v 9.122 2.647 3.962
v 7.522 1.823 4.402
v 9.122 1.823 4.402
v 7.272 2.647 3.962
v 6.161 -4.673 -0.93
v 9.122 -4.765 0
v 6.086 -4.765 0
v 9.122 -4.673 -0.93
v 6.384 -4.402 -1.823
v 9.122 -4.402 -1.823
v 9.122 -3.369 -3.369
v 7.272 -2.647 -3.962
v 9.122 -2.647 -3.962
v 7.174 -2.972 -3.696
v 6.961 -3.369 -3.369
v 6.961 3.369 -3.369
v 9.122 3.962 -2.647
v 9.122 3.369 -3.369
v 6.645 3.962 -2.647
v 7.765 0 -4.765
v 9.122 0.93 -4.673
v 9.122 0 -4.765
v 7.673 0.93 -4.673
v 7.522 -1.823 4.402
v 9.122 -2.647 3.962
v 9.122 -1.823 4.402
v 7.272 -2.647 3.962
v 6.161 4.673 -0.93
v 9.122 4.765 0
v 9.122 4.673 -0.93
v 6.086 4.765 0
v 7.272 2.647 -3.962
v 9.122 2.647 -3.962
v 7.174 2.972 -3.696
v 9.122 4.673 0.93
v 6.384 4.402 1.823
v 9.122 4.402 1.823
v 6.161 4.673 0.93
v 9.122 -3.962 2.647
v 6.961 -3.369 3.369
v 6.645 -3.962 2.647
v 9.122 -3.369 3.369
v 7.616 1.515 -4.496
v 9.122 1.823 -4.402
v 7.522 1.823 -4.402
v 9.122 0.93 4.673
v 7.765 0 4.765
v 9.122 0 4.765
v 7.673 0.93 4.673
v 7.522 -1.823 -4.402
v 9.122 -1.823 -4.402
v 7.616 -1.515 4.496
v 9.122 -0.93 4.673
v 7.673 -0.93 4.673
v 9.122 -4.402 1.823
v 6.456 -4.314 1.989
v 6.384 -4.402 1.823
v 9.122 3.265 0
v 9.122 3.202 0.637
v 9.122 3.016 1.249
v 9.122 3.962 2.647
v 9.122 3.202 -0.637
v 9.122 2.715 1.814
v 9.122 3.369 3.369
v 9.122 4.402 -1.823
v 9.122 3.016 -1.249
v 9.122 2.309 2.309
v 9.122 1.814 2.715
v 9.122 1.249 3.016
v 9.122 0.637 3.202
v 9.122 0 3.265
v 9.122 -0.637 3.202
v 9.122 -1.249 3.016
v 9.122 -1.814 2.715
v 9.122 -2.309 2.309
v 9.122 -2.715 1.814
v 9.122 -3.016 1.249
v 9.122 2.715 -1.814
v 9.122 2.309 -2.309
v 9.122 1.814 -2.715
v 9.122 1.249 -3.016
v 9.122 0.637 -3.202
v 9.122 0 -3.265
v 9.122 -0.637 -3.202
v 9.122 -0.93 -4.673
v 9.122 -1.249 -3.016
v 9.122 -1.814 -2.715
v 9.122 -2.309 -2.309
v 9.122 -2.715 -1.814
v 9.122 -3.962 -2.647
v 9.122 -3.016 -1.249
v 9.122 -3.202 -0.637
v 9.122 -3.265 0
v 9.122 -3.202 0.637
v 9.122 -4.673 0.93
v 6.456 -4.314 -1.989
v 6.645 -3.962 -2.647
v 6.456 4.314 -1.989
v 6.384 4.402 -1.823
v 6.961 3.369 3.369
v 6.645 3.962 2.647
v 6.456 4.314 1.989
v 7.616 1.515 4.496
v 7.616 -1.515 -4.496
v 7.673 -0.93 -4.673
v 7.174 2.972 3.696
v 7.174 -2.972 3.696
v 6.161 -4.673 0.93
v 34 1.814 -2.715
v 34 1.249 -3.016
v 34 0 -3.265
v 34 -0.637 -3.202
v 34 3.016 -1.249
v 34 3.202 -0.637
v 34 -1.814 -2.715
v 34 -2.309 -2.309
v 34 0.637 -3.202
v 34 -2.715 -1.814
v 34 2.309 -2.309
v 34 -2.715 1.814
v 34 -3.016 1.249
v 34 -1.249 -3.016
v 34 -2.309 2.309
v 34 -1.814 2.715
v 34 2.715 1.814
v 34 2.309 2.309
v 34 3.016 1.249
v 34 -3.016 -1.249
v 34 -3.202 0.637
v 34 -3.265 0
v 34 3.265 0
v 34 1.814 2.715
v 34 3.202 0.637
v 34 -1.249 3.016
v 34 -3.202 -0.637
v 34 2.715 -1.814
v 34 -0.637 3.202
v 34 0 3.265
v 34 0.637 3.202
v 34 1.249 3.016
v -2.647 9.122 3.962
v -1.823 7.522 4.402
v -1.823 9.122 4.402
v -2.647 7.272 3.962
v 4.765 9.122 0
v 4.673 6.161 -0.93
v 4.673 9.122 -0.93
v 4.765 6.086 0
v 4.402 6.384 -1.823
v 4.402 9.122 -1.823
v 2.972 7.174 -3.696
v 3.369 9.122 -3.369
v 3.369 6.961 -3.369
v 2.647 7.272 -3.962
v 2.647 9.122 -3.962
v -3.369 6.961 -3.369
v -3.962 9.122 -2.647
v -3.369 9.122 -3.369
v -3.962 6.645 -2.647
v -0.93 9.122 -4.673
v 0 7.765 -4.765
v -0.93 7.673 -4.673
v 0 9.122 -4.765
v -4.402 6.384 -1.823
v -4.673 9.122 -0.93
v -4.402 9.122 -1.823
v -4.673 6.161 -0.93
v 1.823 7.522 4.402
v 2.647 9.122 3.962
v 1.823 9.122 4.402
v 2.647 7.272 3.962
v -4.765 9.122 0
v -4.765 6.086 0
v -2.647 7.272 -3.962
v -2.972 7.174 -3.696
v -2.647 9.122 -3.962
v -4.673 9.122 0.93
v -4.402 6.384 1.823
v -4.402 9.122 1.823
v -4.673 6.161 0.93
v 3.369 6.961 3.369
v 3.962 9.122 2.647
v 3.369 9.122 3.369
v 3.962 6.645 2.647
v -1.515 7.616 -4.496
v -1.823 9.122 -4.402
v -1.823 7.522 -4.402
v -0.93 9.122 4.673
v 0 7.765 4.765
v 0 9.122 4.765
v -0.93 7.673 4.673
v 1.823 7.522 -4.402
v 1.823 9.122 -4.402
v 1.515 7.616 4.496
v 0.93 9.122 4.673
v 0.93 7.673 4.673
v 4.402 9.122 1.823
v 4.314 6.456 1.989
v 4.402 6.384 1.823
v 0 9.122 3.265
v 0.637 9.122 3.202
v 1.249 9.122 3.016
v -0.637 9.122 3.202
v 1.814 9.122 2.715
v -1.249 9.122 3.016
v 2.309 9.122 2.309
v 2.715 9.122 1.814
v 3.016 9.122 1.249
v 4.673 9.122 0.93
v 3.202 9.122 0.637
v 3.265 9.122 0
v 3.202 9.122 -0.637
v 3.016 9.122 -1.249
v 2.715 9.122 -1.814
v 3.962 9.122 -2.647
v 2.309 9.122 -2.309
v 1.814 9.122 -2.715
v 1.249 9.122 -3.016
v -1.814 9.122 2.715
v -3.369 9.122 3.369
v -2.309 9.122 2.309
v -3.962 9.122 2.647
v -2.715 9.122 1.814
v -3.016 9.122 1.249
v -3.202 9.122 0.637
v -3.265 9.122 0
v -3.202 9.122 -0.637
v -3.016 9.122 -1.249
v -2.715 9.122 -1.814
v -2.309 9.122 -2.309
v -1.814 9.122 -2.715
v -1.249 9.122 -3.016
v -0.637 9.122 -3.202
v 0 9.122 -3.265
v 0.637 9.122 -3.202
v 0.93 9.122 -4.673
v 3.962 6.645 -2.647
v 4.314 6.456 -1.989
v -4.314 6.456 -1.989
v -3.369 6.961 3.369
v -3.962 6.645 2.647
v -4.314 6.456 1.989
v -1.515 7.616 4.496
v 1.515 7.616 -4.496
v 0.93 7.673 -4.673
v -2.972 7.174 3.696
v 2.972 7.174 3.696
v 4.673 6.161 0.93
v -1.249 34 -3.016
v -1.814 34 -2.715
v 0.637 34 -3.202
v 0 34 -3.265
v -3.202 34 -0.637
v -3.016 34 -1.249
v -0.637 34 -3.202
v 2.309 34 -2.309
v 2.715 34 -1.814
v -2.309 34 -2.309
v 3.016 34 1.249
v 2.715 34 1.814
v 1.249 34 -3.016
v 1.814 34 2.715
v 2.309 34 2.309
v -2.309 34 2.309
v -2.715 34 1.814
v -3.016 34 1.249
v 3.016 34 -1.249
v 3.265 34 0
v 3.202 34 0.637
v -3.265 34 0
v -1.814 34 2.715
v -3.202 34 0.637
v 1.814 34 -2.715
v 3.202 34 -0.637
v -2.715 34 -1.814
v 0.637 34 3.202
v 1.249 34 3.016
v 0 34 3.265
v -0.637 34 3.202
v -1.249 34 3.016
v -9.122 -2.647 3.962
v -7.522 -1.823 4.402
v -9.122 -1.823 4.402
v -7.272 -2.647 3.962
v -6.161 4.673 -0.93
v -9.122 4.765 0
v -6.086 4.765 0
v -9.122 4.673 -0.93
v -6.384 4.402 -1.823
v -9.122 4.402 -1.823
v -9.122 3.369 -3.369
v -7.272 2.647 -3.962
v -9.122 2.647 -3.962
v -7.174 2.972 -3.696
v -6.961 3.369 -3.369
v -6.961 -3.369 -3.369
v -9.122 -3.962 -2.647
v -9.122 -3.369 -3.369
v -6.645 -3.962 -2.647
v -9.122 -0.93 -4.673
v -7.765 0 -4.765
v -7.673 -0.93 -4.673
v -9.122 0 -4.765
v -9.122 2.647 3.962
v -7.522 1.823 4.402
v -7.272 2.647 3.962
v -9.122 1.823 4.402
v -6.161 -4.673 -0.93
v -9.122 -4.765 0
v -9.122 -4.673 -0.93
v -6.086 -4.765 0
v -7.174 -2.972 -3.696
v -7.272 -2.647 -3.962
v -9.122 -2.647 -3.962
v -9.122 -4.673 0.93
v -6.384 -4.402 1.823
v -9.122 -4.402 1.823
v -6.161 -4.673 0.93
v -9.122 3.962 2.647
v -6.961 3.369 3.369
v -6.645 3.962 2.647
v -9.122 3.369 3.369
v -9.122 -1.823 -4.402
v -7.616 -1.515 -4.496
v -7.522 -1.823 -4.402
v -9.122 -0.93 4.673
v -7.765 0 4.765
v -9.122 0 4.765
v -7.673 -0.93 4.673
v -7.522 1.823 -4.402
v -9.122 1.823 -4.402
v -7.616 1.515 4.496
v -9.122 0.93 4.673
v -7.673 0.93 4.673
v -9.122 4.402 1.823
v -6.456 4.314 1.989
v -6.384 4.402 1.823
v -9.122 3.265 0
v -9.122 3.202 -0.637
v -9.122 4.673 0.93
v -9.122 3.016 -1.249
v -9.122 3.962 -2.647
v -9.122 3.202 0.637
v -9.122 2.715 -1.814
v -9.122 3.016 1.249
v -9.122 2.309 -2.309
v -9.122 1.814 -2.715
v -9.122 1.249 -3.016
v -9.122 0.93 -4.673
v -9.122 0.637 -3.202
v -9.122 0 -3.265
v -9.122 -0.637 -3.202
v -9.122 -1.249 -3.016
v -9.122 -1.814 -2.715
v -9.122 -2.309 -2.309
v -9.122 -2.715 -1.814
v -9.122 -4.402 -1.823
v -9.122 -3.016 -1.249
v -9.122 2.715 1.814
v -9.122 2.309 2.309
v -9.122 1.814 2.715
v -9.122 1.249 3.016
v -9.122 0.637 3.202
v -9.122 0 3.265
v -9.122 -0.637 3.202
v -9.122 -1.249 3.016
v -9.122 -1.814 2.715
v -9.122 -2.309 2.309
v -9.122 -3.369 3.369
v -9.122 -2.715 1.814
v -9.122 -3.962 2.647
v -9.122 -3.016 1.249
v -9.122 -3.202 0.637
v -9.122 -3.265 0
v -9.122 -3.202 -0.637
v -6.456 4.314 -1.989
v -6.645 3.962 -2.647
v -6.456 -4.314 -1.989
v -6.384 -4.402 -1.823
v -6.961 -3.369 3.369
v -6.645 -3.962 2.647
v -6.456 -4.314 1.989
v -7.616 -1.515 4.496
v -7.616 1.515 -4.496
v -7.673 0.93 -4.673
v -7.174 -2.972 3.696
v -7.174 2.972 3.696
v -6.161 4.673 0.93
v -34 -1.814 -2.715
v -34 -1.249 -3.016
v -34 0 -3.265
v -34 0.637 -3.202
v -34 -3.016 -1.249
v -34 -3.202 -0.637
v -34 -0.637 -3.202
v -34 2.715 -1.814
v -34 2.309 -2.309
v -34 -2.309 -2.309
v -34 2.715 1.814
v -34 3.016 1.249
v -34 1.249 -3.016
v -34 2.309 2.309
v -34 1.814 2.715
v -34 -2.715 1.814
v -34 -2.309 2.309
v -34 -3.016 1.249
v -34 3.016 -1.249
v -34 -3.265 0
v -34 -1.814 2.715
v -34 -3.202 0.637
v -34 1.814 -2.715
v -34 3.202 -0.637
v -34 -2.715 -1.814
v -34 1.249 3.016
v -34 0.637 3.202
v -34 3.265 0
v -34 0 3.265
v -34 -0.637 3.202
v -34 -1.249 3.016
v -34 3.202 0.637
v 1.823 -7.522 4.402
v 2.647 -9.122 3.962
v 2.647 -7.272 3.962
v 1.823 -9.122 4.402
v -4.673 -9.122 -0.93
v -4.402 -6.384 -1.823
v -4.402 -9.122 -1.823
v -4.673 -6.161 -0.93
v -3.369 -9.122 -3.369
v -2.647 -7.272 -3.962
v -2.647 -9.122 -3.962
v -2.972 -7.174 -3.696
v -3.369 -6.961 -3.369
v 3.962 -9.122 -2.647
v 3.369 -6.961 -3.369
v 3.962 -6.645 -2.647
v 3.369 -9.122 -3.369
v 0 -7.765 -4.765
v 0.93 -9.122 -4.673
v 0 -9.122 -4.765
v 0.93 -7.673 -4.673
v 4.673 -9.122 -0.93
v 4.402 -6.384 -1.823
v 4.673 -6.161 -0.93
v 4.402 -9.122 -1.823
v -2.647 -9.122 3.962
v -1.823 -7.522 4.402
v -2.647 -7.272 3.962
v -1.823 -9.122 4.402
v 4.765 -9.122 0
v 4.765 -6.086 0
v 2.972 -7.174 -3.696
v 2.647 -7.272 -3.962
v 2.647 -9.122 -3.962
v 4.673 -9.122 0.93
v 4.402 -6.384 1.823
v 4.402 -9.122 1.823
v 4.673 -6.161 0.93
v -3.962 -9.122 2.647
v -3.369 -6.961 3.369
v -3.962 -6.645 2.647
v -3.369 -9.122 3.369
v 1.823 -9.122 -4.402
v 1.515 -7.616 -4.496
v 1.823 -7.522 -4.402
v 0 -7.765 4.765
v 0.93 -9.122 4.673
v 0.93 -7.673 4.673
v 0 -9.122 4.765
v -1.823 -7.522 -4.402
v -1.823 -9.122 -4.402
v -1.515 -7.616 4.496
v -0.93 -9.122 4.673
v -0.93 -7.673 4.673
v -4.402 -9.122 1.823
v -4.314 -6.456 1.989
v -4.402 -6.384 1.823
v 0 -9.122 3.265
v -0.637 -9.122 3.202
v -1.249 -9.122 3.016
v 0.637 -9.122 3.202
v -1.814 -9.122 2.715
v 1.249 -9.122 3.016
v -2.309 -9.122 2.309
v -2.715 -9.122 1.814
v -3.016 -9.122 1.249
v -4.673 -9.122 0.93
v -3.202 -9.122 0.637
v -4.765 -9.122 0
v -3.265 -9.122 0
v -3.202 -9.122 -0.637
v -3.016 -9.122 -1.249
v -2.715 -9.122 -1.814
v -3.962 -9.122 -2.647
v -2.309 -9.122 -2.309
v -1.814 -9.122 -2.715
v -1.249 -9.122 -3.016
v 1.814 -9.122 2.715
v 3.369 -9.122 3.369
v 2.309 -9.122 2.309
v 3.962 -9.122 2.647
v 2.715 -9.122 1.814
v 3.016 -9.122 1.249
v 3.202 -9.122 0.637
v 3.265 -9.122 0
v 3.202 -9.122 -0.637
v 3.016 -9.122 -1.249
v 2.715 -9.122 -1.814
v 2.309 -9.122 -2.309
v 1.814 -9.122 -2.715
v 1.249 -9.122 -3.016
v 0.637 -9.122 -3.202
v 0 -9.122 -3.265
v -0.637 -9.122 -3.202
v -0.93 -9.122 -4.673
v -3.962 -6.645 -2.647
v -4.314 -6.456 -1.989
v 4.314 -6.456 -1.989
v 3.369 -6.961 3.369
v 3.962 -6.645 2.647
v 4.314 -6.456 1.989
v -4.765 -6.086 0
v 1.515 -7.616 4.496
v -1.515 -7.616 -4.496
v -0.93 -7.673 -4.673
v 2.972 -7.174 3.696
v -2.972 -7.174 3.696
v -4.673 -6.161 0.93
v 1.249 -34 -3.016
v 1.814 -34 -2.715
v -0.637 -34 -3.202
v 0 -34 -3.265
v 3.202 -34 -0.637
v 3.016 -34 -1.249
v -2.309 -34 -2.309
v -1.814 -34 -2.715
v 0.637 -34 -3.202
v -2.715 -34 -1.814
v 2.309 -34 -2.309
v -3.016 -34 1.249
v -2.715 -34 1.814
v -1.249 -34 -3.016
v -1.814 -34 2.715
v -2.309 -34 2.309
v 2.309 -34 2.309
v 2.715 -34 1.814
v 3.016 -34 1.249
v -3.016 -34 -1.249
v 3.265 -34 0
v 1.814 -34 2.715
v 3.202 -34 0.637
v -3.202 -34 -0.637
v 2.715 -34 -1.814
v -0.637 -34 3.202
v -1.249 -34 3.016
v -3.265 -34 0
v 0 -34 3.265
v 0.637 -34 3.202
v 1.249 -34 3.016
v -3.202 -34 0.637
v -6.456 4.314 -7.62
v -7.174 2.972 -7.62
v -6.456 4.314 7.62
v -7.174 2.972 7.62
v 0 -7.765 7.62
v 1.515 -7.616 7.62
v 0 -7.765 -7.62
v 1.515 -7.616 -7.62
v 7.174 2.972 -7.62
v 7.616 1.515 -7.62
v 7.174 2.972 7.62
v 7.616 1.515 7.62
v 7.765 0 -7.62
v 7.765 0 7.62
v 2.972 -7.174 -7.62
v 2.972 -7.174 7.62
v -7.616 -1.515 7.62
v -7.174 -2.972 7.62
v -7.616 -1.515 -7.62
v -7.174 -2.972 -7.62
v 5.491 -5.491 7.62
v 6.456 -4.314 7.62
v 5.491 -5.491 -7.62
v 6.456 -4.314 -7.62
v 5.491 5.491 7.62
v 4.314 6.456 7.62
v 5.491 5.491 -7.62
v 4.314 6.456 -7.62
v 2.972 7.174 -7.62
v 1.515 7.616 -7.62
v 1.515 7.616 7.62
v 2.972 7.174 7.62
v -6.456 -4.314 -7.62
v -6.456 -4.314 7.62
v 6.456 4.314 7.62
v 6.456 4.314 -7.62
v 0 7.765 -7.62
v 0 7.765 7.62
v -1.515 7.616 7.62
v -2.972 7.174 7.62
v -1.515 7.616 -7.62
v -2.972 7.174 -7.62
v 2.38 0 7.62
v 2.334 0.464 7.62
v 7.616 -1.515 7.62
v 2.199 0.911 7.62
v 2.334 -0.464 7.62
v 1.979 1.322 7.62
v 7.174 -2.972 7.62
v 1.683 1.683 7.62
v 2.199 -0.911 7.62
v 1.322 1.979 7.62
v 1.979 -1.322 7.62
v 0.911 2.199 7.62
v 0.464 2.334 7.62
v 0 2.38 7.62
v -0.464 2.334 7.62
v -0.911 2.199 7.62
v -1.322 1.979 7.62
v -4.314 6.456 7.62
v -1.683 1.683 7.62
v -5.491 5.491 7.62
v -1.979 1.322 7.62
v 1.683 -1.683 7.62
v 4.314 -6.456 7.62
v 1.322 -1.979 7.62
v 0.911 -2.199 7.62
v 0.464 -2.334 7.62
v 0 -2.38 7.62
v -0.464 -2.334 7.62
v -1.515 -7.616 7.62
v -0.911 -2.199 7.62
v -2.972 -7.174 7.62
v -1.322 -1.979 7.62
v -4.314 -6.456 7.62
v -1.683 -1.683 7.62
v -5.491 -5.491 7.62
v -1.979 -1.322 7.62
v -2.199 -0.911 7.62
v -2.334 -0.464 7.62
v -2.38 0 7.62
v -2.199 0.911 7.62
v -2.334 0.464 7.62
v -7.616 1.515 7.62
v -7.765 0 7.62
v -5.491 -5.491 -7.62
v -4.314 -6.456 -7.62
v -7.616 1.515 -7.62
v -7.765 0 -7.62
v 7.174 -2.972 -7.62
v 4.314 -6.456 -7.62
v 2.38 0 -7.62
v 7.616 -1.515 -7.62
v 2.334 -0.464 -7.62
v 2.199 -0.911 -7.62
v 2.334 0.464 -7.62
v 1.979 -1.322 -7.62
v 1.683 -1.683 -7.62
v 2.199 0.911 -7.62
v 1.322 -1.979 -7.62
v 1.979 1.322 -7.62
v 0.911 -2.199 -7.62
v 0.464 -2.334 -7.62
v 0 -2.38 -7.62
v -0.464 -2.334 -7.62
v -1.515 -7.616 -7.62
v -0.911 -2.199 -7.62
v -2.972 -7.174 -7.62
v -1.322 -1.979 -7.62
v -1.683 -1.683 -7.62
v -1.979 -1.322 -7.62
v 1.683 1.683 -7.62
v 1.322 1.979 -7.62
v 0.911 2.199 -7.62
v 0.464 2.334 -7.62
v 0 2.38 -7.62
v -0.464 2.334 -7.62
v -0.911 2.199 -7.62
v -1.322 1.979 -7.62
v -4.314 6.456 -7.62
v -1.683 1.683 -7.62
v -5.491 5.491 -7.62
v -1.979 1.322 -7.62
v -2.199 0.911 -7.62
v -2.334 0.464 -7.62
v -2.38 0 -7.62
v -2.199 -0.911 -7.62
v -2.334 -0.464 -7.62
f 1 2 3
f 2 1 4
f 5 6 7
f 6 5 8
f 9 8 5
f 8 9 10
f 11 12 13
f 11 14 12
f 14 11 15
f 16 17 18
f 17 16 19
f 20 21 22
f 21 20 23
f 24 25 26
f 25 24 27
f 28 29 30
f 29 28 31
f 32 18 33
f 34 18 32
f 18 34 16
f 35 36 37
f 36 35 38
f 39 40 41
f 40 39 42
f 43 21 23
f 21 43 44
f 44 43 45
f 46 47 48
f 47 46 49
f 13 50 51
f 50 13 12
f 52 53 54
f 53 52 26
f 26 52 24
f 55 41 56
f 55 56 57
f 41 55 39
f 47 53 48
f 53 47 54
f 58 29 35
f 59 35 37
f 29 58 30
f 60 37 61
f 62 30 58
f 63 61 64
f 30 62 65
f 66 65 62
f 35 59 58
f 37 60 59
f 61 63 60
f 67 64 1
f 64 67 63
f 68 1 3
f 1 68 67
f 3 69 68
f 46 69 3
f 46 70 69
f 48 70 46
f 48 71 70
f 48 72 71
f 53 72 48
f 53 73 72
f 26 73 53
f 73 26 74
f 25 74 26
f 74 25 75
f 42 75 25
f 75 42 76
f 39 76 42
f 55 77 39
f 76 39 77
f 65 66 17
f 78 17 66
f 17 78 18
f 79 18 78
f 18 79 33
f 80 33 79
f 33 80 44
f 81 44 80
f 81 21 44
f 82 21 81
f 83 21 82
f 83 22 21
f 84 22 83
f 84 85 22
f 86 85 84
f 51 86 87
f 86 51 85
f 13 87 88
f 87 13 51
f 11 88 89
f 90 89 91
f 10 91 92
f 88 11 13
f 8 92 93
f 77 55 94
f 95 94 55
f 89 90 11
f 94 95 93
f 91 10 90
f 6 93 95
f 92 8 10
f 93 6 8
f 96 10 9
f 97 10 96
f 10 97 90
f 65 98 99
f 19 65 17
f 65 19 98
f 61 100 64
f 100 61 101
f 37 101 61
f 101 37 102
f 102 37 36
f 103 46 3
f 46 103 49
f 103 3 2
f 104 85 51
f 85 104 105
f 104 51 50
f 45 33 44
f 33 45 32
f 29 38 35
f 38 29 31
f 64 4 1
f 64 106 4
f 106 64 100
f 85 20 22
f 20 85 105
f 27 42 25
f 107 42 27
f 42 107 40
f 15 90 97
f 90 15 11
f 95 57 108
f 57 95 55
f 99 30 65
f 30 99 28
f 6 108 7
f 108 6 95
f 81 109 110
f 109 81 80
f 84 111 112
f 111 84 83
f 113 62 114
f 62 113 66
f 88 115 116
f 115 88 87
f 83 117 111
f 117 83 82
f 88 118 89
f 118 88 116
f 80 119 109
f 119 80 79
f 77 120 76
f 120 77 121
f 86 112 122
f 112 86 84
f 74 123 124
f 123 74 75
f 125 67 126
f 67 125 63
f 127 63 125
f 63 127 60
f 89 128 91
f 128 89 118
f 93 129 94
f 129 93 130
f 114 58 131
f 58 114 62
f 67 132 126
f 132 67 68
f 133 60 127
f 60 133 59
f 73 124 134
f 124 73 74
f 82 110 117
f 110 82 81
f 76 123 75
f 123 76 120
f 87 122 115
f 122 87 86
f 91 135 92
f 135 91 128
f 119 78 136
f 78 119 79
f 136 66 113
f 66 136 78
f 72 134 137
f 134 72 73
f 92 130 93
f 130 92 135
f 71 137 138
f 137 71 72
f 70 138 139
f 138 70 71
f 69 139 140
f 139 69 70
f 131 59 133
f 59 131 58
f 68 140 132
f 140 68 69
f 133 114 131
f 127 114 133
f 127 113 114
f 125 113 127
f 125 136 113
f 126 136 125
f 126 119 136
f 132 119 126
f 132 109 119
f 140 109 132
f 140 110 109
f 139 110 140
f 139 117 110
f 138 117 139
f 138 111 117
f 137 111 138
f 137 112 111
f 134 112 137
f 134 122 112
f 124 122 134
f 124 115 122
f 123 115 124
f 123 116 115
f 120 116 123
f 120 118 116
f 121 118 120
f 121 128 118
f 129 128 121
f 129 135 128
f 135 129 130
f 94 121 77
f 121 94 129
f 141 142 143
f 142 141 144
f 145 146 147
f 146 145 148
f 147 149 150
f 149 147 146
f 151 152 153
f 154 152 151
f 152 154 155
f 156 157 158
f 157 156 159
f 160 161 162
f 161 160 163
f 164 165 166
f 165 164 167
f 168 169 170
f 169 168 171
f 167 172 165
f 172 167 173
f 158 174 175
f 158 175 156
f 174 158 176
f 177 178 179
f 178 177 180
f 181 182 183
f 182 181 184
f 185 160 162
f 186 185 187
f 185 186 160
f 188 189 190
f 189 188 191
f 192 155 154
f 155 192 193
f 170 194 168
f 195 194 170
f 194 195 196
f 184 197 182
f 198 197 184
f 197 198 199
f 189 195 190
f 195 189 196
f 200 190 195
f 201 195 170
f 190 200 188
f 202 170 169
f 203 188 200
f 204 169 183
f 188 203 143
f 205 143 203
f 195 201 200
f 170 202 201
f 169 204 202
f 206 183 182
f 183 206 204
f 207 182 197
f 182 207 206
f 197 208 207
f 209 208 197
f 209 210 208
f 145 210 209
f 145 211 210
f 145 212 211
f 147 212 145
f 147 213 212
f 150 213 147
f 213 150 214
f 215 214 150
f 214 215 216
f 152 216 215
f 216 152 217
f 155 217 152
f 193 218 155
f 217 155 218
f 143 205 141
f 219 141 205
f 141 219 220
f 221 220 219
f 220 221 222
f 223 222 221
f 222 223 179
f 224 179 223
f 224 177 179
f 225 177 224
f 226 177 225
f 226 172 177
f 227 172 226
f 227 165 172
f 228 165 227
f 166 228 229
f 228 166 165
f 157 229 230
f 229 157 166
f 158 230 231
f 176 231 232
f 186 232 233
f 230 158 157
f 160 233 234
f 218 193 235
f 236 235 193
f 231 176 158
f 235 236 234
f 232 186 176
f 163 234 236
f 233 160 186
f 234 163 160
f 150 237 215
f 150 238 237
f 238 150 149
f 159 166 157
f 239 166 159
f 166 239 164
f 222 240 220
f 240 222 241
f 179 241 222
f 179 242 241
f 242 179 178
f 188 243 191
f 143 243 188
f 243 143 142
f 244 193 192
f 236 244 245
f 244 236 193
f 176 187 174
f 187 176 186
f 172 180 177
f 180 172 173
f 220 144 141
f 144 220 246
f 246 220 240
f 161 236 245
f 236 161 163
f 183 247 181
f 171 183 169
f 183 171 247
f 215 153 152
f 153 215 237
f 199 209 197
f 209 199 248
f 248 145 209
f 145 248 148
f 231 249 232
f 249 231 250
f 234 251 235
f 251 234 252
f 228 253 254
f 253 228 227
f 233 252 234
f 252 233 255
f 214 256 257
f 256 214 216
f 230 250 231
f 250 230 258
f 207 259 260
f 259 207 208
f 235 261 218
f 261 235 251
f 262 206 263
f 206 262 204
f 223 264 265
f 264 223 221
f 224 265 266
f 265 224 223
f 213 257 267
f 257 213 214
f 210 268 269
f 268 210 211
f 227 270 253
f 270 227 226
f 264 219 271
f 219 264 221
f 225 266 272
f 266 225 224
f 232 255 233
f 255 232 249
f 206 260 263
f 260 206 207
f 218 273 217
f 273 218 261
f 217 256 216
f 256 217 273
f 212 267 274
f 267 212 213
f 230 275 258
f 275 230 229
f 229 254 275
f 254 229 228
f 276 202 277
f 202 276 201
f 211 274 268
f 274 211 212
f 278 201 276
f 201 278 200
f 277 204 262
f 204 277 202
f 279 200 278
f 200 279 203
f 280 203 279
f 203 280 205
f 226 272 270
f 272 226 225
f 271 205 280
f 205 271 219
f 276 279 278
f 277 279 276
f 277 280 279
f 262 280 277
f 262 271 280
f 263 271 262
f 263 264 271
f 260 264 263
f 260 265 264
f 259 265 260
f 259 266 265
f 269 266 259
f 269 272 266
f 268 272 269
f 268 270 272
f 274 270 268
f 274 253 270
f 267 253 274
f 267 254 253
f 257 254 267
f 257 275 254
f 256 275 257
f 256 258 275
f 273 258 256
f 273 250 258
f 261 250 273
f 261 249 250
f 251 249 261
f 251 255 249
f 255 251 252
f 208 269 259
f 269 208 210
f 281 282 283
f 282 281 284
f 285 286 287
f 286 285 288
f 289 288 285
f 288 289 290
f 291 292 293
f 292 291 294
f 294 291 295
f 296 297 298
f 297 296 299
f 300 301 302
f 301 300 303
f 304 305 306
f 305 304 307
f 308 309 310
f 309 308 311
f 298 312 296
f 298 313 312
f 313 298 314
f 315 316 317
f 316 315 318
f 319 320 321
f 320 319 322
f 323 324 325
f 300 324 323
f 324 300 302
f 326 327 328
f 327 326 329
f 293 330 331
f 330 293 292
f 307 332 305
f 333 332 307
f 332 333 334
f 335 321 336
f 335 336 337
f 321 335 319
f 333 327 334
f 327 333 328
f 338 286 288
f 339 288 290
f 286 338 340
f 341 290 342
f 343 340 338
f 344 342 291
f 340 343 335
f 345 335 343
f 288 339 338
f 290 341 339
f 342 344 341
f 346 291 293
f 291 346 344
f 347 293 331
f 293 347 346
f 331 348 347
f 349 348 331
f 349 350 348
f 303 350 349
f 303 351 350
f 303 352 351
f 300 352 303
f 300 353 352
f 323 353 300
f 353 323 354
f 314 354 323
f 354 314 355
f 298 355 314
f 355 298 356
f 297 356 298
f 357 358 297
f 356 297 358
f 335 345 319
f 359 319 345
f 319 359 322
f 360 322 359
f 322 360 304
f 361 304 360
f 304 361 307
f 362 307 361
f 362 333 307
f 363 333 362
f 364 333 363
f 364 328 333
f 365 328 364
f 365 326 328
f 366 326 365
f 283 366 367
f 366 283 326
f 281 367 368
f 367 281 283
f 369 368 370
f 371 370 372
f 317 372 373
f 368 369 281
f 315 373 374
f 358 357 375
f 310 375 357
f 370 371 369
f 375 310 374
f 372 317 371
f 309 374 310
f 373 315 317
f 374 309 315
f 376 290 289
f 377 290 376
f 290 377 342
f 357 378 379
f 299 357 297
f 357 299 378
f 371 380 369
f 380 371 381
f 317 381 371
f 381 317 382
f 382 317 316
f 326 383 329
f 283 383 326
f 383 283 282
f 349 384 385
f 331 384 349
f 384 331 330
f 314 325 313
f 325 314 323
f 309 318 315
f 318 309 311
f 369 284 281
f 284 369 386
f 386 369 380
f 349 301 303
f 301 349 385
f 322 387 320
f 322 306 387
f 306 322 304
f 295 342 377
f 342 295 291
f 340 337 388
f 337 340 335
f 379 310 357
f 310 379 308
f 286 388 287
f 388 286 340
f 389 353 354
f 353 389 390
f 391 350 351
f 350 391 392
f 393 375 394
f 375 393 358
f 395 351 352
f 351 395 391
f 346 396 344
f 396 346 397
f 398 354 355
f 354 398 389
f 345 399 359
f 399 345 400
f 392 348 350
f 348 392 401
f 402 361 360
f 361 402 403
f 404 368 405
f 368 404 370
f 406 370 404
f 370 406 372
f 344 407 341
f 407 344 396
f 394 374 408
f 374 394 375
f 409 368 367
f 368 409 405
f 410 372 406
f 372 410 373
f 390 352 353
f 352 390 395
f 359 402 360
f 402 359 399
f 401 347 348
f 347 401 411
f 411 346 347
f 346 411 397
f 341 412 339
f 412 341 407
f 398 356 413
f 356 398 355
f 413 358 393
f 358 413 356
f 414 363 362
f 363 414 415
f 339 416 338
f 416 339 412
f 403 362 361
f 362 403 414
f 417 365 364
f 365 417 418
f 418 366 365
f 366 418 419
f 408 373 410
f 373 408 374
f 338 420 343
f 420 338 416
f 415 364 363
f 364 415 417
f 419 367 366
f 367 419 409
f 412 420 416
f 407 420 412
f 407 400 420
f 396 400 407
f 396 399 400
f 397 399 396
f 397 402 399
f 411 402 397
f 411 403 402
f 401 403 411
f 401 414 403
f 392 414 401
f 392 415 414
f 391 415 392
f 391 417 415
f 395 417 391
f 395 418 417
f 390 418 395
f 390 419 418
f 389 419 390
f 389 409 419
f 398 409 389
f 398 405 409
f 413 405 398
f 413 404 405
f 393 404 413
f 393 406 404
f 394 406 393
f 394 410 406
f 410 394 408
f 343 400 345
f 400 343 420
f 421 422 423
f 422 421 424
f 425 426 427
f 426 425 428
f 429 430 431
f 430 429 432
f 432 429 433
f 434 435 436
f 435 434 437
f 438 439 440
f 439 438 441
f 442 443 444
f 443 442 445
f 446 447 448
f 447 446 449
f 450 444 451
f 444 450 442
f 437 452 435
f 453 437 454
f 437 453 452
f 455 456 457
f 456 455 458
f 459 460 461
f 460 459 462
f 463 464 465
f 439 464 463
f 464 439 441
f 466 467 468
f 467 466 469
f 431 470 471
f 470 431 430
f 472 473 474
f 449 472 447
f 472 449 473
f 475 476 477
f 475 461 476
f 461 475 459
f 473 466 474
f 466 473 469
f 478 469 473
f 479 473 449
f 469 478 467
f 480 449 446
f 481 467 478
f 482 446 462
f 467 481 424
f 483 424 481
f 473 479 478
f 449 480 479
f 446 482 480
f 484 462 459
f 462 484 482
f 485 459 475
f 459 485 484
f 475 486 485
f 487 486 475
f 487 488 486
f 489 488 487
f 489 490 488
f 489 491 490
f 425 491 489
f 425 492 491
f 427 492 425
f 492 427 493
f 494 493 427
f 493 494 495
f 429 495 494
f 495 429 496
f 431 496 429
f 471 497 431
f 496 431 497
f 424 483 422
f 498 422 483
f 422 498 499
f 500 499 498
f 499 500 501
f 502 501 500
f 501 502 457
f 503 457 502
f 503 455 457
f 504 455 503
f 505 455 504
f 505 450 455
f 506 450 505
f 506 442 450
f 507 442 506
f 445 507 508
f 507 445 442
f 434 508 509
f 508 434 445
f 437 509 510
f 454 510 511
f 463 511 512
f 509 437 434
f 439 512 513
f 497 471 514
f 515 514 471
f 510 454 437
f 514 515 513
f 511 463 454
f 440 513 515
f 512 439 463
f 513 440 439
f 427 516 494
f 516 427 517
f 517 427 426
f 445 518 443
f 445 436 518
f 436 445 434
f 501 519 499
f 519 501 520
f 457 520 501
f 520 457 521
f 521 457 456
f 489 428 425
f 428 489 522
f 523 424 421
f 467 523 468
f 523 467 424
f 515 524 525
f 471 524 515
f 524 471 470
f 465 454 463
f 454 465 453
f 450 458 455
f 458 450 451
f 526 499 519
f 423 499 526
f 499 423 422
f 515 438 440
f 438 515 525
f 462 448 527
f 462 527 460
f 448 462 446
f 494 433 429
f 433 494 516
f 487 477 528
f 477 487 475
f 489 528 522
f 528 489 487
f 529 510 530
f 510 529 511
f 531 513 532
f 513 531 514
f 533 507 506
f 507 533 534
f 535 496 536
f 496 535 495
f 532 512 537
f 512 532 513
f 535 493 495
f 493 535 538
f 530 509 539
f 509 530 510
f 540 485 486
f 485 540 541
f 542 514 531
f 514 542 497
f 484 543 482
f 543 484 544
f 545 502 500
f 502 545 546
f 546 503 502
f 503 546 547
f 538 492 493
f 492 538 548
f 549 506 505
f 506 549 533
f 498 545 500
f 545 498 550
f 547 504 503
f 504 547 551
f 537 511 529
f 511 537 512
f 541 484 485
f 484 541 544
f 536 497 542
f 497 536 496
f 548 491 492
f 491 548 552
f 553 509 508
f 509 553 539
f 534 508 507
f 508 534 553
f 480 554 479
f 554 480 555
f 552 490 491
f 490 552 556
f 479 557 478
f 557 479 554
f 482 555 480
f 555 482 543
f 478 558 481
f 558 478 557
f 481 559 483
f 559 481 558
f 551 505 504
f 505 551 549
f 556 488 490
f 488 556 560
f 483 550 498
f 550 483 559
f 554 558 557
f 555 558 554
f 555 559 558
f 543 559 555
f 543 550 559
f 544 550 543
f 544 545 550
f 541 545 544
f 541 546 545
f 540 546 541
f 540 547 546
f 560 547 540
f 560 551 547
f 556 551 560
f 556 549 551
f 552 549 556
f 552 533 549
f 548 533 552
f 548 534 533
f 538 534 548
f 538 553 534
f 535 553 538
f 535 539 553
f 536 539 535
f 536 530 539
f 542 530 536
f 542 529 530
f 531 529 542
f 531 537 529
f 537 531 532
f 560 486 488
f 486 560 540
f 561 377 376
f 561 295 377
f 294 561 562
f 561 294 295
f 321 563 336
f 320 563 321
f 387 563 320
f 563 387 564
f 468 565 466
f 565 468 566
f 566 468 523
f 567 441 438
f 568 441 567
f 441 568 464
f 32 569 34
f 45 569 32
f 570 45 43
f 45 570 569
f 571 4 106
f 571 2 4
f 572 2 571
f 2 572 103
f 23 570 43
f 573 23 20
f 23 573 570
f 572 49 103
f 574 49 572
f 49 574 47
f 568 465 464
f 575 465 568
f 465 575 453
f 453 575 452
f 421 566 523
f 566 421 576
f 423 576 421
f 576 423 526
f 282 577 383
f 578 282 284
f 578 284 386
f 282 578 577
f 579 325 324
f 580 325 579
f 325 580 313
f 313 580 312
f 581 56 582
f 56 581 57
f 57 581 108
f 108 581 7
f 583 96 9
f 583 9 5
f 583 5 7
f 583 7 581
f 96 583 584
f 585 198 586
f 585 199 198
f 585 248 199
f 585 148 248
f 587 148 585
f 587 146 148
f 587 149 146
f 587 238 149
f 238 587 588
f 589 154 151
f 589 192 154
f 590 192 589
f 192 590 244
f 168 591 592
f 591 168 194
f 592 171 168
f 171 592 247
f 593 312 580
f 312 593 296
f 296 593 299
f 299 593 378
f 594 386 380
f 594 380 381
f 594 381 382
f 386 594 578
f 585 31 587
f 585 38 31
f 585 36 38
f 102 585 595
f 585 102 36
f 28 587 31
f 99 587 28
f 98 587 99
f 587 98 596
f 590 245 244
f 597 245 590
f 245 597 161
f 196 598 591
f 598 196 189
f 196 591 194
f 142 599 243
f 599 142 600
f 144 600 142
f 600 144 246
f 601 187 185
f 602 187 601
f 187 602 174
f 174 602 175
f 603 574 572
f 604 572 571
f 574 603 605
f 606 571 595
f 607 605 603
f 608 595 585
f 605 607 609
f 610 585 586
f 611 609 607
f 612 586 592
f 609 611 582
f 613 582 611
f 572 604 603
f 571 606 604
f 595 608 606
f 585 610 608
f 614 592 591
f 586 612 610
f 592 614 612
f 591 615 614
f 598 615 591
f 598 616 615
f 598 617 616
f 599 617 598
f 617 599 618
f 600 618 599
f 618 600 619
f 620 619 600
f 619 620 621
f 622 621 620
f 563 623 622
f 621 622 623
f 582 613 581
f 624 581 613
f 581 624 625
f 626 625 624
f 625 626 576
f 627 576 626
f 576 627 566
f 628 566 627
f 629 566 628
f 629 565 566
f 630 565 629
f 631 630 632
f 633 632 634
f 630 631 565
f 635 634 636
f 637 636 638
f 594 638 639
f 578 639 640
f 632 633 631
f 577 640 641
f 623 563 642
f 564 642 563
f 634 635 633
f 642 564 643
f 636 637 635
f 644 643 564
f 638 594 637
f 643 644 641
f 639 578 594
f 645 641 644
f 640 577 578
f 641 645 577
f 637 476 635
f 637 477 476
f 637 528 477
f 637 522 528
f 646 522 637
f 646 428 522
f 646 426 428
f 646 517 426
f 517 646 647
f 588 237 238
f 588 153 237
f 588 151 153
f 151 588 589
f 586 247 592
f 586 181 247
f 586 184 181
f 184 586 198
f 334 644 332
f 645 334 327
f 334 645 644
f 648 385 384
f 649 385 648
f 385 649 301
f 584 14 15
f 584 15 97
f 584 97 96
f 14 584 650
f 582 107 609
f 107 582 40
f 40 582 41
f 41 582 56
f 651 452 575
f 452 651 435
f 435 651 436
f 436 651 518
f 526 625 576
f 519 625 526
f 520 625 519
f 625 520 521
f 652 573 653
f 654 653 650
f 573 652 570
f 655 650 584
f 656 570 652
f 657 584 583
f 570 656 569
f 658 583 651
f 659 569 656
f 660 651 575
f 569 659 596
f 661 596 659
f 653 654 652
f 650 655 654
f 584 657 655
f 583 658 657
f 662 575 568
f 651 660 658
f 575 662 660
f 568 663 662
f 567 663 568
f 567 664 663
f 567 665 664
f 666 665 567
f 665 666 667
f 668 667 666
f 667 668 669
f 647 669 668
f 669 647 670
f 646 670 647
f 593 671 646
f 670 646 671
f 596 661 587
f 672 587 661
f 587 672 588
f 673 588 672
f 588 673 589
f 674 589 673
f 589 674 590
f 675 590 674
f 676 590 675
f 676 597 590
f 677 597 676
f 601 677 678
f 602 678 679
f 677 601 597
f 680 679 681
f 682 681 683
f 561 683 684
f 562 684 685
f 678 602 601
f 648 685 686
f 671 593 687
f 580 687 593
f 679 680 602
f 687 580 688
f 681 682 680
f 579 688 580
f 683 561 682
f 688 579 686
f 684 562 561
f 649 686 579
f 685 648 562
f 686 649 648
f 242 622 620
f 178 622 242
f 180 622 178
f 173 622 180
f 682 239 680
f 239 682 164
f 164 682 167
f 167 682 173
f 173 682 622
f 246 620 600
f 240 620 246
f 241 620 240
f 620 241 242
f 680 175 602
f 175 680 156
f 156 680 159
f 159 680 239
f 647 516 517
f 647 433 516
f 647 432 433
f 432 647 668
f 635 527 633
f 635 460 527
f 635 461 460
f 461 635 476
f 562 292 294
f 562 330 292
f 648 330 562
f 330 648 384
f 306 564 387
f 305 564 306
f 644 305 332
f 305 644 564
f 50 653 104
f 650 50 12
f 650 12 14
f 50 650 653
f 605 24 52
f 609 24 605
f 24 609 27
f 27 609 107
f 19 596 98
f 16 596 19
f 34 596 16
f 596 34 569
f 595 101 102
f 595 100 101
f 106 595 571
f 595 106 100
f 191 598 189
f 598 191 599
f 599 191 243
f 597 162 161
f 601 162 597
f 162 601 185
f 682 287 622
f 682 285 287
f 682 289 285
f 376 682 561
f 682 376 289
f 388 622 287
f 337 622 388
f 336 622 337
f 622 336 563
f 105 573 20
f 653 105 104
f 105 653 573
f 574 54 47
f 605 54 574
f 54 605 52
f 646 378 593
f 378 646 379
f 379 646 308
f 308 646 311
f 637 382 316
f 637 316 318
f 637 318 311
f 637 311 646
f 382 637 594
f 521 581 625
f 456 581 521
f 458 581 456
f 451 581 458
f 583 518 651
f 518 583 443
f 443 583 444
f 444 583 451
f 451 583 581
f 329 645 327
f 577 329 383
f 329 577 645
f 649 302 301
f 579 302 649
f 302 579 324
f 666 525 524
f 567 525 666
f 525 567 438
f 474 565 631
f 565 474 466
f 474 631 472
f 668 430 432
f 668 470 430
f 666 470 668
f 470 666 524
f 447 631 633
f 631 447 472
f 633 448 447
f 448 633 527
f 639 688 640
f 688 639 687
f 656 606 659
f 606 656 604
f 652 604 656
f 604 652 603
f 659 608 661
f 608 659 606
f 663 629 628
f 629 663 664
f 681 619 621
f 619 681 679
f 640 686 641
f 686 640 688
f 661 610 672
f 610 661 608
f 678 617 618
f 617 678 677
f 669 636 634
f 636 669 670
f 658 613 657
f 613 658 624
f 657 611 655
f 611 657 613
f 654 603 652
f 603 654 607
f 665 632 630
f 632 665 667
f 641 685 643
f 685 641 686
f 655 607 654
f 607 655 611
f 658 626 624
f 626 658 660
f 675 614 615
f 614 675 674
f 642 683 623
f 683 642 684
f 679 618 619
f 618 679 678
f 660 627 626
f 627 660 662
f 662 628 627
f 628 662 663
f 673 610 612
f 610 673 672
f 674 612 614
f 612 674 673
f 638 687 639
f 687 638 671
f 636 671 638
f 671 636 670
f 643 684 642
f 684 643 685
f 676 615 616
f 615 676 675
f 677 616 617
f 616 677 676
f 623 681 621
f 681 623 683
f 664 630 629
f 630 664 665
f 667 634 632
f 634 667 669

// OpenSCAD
$fn = 32;

// ----------------------------------------------------------------------
// Cardan cross: 68 mm span, 9.53 mm trunnions
// ----------------------------------------------------------------------

// --- parameters (mm) ---
journal_d = 9.53;         // trunnion diameter
arm_len = 34;             // trunnion length from the centre
step_r = 3.24;            // step position from the centre
step_d = 6.53;            // journal diameter after the step
hub_d = 15.53;            // hub diameter
hub_h = 15.24;            // hub height
bore_d = 4.76;            // hub bore

difference() {
  union() {
    /* hub along the joint axis */
    cylinder(h = hub_h, d = hub_d, center = true);
    for (a = [0 : 90 : 270]) rotate([0, 0, a]) {
      /* trunnion, sunk into the hub */
      translate([hub_d / 4, 0, 0]) rotate([0, 90, 0]) cylinder(h = step_r + 2, d = journal_d);
      /* stepped journal out to the tip */
      translate([step_r - 0.5, 0, 0]) rotate([0, 90, 0]) cylinder(h = arm_len + 0.5 - step_r, d = step_d);
    }
  }
  /* lubrication bore through the hub, 2.5 mm clear on both sides */
  translate([0, 0, -hub_h / 2 - 2.5]) cylinder(h = hub_h + 5, d = bore_d);
}
